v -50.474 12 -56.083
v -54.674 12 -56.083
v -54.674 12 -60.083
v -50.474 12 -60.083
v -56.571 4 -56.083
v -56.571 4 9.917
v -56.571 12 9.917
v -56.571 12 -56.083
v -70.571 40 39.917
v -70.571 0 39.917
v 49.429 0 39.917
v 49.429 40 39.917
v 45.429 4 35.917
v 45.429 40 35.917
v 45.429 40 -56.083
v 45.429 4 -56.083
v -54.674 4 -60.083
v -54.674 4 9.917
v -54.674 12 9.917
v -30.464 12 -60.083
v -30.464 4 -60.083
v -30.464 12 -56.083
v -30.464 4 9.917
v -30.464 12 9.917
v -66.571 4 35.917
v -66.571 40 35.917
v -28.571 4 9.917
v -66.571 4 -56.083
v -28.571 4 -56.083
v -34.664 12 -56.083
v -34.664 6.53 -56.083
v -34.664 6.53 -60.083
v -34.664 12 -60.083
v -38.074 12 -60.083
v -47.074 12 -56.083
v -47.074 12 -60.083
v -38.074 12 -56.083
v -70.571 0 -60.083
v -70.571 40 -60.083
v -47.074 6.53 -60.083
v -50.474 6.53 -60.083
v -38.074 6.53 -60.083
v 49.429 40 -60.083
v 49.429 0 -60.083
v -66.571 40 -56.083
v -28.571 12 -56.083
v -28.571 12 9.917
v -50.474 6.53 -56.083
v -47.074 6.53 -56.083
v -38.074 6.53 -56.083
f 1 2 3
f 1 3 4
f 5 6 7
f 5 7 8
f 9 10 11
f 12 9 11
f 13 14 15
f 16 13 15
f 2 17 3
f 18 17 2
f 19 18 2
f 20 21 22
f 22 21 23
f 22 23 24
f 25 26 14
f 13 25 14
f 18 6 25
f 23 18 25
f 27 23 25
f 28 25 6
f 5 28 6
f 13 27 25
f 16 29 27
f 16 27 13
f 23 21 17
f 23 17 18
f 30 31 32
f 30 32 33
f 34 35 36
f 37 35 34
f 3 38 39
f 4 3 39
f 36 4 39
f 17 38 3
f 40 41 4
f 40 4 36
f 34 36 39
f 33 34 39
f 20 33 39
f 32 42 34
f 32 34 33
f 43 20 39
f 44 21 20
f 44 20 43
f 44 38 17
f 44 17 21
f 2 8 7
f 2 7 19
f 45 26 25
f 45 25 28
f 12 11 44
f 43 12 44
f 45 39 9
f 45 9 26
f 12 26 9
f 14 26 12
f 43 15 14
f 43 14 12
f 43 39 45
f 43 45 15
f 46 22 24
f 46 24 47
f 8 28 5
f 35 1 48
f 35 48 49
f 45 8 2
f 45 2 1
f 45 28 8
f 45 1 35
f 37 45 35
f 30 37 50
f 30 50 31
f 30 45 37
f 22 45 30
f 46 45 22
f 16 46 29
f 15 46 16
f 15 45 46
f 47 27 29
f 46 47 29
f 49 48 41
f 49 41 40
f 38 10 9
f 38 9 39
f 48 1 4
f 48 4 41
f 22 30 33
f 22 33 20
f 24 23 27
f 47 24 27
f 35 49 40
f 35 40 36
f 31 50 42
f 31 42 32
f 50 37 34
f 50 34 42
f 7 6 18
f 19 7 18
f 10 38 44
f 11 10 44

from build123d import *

# Parameters (mm, degrees)
SKETCH1_W           = 120
SKETCH1_H           = 100
BOSS_EXTRUDE1_DEPTH = 40
SKETCH2_W           = 112
SKETCH2_H           = 92
CUT_EXTRUDE1_DEPTH  = 36
SKETCH3_W           = 28
SKETCH3_H           = 70
BOSS_EXTRUDE3_DEPTH = 8
SKETCH6_W           = 24.21
SKETCH6_H           = 8
CUT_EXTRUDE4_DEPTH  = 66
CUT_EXTRUDE6_DEPTH  = 66


with BuildPart() as part:
    # Sketch1 → Boss-Extrude1 (new body)
    with BuildSketch(Plane(origin=(0, 0, 0), x_dir=(1, 0, 0), z_dir=(0, 1, 0))):
        with Locations((-10.571222942, 10.082692781)):
            Rectangle(SKETCH1_W, SKETCH1_H)
    extrude(amount=BOSS_EXTRUDE1_DEPTH)

    # Sketch2 → Cut-Extrude1 (cut)
    with BuildSketch(Plane(origin=(0, 40, 0), x_dir=(1, 0, 0), z_dir=(0, 1, 0))):
        with Locations((-10.571222942, 10.082692781)):
            Rectangle(SKETCH2_W, SKETCH2_H)
    extrude(amount=-CUT_EXTRUDE1_DEPTH, mode=Mode.SUBTRACT)

    # Sketch3 → Boss-Extrude3 (add)
    with BuildSketch(Plane(origin=(0, 4, 0), x_dir=(1, 0, 0), z_dir=(0, 1, 0))):
        with Locations((-42.571222942, 25.082692781)):
            Rectangle(SKETCH3_W, SKETCH3_H)
    extrude(amount=BOSS_EXTRUDE3_DEPTH)

    # Sketch6 → Cut-Extrude4 (cut)
    with BuildSketch(Plane.XY.offset(9.917307219)):
        with Locations((-42.569304131, 8)):
            Rectangle(SKETCH6_W, SKETCH6_H)
    extrude(amount=-CUT_EXTRUDE4_DEPTH, mode=Mode.SUBTRACT)

    # Sketch7 → Cut-Extrude6 (cut)
    with BuildSketch(Plane.XY.offset(-56.082692781)):
        Polygon((-54.674304131, 12), (-50.474304131, 12), (-50.474304131, 6.53), (-47.074304131, 6.53), (-47.074304131, 12), (-38.074304131, 12), (-38.074304131, 6.53), (-34.664304131, 6.53), (-34.664304131, 12), (-30.464304131, 12), (-30.464304131, 6.53), (-30.464304131, 4), (-54.674304131, 4), (-54.674304131, 6.53), align=None)
    extrude(amount=-CUT_EXTRUDE6_DEPTH, mode=Mode.SUBTRACT)


solid = part.part
